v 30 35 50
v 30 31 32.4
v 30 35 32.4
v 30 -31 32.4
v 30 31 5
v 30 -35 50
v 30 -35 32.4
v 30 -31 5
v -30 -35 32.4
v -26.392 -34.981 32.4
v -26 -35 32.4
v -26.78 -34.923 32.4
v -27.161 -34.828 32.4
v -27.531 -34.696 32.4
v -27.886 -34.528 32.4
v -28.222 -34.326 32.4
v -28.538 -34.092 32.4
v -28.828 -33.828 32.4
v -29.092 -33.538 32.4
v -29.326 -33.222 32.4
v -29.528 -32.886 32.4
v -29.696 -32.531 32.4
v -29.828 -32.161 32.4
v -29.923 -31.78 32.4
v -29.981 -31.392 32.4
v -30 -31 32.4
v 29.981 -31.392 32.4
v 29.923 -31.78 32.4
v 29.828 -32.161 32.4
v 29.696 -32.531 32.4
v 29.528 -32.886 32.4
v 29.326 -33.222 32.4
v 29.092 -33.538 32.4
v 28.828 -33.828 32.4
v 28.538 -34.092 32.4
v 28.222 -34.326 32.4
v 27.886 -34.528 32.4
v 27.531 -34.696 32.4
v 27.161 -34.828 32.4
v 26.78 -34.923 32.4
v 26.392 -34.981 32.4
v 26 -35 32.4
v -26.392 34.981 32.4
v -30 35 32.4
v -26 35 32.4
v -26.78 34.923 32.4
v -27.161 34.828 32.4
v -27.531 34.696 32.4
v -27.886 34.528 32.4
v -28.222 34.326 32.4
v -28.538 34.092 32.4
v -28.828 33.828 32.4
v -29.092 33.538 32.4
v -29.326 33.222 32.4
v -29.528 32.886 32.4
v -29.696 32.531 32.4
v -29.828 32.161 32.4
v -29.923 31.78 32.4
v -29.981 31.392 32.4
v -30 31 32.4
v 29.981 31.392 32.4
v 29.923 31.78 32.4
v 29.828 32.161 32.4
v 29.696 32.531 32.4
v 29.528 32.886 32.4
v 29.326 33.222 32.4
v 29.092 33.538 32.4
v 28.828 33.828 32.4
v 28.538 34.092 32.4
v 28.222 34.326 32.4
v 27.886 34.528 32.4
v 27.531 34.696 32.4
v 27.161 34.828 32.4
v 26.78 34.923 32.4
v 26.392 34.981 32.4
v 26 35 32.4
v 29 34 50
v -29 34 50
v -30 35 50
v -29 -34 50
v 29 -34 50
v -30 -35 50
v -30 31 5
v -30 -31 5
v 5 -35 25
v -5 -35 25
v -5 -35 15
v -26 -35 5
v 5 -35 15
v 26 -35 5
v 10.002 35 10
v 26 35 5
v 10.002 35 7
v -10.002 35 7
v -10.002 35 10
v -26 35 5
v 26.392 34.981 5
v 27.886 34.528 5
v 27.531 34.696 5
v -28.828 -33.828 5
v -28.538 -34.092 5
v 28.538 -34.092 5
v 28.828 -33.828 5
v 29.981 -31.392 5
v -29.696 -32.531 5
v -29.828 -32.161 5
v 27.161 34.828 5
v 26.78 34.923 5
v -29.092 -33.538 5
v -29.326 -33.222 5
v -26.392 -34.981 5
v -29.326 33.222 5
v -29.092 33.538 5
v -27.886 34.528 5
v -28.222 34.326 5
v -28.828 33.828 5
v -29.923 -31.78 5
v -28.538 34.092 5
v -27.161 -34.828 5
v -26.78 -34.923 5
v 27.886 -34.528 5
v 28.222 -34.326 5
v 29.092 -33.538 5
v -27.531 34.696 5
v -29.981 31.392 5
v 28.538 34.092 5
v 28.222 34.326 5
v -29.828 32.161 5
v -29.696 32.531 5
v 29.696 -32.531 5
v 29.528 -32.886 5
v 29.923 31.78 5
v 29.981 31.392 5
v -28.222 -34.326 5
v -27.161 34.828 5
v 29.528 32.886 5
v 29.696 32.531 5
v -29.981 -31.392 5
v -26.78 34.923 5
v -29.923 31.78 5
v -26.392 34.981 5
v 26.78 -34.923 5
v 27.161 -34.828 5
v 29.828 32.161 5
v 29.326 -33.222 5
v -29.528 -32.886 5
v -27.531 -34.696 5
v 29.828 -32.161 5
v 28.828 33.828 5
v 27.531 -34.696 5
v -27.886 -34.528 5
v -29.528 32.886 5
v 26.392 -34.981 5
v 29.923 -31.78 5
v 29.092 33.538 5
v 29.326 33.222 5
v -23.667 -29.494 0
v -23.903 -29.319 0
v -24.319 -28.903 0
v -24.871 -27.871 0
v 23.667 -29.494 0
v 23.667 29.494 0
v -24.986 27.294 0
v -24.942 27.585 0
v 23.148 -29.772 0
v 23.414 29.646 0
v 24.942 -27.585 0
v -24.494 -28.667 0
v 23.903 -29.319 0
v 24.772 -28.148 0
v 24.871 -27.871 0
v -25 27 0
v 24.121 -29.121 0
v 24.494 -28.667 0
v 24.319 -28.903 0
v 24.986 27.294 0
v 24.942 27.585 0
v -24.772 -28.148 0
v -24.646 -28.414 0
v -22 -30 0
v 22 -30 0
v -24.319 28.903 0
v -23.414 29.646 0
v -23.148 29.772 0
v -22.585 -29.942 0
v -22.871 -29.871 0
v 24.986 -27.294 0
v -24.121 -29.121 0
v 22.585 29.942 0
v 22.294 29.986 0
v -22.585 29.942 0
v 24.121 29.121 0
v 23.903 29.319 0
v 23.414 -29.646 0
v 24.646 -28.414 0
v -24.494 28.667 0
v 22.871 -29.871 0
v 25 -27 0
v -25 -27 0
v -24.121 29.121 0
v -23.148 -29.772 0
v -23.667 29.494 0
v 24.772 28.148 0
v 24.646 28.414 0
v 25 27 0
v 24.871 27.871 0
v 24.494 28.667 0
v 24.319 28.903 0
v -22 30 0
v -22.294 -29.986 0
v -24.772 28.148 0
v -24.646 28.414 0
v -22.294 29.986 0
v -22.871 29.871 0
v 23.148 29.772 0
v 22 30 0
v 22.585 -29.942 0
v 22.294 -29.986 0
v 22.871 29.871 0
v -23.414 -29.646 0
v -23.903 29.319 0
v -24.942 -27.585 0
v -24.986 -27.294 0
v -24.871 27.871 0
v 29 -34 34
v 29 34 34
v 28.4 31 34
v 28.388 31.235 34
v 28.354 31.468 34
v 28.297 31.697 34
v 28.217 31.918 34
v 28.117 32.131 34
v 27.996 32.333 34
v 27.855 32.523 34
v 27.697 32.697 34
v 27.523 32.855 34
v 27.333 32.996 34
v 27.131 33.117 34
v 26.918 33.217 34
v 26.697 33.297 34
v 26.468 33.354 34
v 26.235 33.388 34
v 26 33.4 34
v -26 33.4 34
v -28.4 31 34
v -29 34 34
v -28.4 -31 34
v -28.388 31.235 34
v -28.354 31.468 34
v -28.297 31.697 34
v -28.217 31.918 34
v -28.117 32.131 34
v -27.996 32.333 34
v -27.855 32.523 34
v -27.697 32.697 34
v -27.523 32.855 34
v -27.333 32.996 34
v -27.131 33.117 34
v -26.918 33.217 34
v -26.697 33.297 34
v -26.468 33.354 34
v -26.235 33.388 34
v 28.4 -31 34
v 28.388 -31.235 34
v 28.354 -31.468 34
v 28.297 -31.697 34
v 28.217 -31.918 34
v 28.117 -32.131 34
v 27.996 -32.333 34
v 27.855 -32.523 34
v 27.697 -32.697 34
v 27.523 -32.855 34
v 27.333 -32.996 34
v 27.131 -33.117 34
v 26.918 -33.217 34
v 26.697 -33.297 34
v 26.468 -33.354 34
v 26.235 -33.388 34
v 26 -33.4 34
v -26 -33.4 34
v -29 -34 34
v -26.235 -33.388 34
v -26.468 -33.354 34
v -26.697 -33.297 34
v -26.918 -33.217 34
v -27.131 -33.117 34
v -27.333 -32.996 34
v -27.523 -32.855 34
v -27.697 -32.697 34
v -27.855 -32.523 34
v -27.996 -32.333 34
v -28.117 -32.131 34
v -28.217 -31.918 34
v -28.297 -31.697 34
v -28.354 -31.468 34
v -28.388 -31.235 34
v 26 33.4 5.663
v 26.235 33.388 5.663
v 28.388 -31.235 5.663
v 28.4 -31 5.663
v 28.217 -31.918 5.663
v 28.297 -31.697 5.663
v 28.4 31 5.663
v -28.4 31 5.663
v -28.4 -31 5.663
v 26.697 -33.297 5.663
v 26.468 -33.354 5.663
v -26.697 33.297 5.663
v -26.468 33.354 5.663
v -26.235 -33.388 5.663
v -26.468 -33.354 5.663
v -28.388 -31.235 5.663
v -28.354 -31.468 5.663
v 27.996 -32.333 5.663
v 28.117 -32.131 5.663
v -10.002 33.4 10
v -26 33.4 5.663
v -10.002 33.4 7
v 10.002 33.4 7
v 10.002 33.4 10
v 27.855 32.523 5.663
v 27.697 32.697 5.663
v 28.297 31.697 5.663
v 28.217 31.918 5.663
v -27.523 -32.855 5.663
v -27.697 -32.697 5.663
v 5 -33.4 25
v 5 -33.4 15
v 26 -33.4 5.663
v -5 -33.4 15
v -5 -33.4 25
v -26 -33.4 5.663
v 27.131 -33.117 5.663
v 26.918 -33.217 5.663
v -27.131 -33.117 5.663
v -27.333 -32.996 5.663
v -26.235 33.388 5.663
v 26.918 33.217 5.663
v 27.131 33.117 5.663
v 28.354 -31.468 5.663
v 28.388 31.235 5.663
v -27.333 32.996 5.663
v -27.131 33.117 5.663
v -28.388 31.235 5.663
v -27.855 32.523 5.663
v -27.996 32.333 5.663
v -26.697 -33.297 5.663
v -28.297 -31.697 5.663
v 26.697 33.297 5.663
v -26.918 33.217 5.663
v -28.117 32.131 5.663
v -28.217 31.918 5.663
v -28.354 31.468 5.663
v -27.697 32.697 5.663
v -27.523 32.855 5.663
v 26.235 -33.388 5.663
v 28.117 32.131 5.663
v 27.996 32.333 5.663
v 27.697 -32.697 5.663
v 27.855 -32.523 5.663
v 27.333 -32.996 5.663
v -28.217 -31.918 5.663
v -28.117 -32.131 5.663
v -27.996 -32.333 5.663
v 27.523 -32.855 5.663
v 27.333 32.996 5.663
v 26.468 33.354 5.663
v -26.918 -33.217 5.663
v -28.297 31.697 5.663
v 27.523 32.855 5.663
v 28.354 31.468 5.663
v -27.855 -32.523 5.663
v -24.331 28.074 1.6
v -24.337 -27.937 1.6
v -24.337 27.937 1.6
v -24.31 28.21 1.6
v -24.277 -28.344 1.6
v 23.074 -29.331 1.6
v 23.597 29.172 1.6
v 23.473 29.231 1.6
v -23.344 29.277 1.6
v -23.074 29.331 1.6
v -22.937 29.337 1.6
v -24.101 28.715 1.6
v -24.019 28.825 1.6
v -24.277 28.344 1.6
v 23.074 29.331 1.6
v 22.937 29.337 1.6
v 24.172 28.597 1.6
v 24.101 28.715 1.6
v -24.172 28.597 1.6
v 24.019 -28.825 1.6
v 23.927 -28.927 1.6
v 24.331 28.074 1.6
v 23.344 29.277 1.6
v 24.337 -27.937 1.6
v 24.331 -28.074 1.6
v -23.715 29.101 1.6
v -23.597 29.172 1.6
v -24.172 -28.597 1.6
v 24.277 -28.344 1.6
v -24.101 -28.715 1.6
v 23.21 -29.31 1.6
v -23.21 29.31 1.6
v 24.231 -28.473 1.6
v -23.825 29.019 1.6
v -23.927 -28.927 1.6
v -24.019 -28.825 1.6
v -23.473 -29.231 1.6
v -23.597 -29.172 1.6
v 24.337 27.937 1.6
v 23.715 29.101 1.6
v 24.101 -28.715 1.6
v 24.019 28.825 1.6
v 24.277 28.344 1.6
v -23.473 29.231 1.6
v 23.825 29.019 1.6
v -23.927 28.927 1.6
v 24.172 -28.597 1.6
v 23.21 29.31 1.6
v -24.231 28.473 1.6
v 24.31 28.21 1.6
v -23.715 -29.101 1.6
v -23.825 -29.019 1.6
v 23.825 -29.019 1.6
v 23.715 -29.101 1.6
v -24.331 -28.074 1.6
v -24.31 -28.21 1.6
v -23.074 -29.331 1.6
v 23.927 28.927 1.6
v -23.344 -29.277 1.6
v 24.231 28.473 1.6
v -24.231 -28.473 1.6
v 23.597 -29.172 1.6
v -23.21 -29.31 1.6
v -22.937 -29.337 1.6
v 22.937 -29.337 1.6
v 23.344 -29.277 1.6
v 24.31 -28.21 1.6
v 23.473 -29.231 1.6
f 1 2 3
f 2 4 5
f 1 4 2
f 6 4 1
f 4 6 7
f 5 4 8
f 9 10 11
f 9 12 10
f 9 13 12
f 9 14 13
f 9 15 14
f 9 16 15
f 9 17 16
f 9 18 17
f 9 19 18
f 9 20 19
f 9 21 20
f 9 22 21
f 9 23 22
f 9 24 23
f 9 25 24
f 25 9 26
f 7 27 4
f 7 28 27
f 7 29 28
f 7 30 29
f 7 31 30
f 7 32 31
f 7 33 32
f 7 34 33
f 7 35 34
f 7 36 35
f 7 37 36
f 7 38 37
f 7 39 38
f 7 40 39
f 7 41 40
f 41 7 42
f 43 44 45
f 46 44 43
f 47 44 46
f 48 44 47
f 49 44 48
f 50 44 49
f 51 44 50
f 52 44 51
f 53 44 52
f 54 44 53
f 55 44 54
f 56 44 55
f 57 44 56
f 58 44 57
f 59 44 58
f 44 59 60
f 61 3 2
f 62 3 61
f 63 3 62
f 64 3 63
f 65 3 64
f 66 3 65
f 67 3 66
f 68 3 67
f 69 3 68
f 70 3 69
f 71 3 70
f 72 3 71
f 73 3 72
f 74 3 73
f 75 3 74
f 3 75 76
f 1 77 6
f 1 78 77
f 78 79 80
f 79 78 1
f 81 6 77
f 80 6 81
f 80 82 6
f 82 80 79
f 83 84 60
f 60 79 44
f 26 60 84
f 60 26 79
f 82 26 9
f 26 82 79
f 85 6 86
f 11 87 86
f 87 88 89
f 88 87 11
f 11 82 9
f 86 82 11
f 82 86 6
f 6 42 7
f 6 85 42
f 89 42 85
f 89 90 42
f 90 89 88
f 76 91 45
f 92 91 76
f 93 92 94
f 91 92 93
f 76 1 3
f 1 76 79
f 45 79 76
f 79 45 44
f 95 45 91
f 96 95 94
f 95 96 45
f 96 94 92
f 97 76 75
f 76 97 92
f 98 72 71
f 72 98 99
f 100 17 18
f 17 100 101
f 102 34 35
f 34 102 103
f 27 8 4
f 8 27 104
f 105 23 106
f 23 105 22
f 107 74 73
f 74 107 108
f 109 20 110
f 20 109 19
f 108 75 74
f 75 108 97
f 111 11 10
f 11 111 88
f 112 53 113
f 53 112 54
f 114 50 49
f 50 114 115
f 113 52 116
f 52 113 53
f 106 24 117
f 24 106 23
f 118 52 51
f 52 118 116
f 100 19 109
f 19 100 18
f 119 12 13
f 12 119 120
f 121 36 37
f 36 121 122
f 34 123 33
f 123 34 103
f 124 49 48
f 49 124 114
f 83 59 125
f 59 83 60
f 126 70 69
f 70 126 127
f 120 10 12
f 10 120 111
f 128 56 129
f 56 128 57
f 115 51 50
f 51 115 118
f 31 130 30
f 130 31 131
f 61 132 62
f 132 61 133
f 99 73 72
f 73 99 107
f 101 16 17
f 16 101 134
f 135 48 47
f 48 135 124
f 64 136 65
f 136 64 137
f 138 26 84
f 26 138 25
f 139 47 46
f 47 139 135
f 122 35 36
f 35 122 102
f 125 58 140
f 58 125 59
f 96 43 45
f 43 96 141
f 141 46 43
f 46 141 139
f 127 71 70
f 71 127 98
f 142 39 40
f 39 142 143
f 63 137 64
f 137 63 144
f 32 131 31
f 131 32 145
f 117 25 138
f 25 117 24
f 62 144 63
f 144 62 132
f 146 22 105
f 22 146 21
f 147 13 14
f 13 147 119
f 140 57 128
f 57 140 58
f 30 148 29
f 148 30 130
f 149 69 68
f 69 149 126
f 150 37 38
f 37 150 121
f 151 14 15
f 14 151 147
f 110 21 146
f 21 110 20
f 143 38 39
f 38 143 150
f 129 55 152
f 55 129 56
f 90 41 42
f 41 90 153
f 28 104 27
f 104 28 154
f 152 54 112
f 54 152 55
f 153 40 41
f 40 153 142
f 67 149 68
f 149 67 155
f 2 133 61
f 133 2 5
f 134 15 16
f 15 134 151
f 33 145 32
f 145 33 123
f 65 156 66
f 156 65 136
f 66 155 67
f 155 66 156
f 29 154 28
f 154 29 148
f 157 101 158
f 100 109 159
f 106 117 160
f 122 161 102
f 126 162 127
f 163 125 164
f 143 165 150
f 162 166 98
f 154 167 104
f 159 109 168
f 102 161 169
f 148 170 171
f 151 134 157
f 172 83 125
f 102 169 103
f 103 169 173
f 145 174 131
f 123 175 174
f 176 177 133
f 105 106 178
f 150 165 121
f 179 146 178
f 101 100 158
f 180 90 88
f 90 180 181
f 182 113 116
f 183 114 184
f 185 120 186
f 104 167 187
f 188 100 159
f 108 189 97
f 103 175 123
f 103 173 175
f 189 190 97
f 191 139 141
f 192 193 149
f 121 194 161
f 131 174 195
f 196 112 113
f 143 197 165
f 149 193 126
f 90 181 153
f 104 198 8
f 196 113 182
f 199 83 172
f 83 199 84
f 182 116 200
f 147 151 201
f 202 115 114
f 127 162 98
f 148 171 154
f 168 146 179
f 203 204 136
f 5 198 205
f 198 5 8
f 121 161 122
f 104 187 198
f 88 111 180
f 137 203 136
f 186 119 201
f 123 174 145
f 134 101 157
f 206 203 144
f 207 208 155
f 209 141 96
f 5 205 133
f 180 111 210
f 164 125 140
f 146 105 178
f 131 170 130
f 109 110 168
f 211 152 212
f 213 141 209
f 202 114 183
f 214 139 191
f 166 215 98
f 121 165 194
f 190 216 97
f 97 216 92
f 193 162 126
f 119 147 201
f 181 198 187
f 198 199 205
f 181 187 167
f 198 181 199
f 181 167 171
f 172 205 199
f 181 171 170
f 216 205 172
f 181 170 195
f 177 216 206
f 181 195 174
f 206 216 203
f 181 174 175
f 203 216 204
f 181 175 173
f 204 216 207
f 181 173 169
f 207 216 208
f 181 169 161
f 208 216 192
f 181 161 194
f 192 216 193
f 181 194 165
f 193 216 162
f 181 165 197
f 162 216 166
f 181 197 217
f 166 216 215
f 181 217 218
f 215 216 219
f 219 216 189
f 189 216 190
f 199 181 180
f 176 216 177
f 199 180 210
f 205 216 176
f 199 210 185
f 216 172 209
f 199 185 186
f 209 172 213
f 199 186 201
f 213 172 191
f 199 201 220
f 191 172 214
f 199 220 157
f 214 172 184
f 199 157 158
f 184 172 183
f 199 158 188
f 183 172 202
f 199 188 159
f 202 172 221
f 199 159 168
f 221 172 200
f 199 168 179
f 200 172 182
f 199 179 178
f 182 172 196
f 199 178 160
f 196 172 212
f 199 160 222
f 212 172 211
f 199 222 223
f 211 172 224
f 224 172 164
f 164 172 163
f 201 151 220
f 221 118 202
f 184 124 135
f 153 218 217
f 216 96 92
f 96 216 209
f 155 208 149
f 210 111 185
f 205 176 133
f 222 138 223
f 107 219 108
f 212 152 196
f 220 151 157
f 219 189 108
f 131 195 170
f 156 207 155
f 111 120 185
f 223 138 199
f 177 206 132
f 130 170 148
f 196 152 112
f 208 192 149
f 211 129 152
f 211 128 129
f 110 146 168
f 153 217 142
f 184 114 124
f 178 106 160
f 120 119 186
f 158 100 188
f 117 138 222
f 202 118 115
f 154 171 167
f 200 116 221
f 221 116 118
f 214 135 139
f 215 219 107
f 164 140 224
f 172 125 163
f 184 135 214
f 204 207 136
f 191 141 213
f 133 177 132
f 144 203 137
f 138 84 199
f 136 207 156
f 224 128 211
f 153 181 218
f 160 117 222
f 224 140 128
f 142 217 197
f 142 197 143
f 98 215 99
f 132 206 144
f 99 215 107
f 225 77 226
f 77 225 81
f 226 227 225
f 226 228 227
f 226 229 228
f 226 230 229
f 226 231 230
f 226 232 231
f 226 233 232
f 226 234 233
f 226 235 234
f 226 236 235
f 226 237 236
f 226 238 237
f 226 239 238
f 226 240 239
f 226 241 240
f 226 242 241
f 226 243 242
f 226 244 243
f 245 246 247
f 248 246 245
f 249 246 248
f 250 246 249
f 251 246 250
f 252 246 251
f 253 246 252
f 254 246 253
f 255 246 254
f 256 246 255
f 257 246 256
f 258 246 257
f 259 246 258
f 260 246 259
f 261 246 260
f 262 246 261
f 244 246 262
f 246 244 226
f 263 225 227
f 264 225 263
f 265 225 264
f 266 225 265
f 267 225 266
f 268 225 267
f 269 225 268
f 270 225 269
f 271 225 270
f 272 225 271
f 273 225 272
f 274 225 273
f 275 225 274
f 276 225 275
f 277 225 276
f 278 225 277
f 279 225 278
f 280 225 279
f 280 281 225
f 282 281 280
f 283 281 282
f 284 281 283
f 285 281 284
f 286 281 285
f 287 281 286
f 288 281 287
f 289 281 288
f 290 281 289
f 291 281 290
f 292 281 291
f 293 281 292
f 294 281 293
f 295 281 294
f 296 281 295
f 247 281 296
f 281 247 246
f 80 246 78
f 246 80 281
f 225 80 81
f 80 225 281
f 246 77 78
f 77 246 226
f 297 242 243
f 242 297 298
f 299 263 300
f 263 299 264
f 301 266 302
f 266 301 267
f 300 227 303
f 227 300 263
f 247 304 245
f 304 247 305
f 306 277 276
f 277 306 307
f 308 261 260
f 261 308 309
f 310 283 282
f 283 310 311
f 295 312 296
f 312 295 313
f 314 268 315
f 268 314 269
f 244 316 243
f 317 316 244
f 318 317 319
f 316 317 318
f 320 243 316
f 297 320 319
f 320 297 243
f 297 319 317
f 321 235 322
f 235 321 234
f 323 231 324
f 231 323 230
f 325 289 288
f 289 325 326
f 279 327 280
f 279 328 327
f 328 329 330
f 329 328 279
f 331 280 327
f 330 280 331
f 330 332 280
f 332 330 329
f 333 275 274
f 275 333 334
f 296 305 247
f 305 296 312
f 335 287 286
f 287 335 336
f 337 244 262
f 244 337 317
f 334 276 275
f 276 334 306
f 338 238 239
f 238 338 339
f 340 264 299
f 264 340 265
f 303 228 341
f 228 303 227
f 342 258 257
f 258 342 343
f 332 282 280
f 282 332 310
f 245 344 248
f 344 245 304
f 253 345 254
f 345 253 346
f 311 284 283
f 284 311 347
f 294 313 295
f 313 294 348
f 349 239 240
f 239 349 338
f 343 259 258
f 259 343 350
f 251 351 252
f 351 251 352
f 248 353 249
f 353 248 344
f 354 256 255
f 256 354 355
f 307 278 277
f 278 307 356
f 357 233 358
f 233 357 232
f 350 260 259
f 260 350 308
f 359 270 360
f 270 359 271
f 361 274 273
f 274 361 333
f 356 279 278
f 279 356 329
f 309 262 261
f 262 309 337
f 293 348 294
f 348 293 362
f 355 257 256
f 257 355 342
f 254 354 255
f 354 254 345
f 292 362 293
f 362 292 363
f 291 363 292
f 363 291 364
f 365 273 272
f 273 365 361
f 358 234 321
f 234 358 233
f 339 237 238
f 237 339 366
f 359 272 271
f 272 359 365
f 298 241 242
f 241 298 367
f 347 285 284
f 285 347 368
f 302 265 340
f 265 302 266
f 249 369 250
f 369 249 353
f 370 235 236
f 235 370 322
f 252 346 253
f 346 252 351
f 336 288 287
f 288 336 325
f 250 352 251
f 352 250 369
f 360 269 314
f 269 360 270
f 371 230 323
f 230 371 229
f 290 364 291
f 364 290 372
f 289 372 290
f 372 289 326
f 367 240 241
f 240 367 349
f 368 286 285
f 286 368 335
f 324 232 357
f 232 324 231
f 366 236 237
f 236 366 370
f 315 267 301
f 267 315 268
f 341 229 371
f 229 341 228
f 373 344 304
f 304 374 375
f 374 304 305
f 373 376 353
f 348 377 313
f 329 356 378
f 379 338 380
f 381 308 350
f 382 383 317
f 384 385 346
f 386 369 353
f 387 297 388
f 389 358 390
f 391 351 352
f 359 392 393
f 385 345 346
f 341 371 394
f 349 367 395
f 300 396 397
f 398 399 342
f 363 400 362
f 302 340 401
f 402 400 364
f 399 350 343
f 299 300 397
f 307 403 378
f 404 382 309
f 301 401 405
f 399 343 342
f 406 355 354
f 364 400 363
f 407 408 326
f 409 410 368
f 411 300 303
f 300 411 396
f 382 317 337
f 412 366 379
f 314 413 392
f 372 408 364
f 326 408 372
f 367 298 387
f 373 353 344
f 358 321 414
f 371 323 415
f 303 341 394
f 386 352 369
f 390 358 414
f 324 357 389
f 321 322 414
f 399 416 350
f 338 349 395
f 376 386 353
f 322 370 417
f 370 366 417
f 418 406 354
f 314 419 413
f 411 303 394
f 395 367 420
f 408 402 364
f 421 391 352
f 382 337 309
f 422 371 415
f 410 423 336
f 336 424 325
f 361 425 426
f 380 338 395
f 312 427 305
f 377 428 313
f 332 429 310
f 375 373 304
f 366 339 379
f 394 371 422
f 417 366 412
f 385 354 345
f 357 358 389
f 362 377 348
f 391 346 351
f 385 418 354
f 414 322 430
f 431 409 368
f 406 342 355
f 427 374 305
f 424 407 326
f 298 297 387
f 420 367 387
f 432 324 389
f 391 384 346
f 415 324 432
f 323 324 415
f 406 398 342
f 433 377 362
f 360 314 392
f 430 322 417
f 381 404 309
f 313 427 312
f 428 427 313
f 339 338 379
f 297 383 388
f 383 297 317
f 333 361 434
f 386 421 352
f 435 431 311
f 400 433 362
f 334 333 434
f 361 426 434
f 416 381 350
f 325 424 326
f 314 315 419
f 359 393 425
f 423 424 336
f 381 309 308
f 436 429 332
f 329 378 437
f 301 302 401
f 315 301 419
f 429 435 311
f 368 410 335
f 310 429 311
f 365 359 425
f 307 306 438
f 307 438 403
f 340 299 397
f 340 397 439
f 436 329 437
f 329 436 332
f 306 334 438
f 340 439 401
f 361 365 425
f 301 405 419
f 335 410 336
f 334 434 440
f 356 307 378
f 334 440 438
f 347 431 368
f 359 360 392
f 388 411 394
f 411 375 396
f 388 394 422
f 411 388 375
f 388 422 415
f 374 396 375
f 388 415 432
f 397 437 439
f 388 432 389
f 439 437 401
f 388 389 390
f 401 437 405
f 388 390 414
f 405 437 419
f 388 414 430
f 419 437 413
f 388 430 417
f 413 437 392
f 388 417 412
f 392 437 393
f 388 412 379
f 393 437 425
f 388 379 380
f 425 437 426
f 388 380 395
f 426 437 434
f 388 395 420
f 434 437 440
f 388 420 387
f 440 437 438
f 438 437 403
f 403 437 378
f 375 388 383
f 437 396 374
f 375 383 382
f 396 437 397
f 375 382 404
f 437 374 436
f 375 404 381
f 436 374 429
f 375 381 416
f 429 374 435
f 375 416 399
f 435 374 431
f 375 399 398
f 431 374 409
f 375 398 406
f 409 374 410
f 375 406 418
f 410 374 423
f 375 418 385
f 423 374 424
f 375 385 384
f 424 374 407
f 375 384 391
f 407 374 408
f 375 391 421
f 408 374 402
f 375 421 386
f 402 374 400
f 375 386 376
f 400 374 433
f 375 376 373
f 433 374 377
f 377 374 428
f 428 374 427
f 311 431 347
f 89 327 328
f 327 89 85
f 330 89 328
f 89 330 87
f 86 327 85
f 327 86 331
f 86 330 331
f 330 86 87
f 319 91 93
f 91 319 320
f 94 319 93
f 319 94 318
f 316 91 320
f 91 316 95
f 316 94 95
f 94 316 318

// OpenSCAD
// Corrected body: closed roof with a small sloping edge, not a raised rim.
// Millimetres; front = -Y, rear = +Y, assembled bottom = Z=0.
width = 60;
depth = 70;
height = 50;
bevel = 5;
wall = 1.6;
top_thickness = 1.6;
base_wall = 1;
base_band = 16;
corner_radius = 4;
usb_size = 10;
usb_top_offset = 15;
oled_slot_width = 20.005;
oled_slot_height = 3;
oled_slot_z = 40;
print_orientation = true;
$fn = 64;

module rounded_rectangle(w,d,r) {
    offset(r=r) square([w-2*r,d-2*r],center=true);
}

module profile_at(w,d,r,z) {
    translate([0,0,z]) linear_extrude(height=0.01)
        rounded_rectangle(w,d,r);
}

module body() {
    inner_bevel_z = height-bevel-wall*(sqrt(2)-1);
    inner_top_z = height-top_thickness;
    inner_shrink = inner_top_z-inner_bevel_z;
    difference() {
        union() {
            // Lower cavity is 58 x 68 x 16 mm with the widened footprint.
            translate([-width/2,-depth/2,0]) cube([width,depth,base_band+wall]);
            translate([0,0,base_band+wall])
                linear_extrude(height=height-bevel-base_band-wall)
                    rounded_rectangle(width,depth,corner_radius);
            // Small 5 mm sloped shoulder around a closed, flat central roof.
            hull() {
                profile_at(width,depth,corner_radius,height-bevel-0.01);
                profile_at(width-2*bevel,depth-2*bevel,3,height-0.01);
            }
        }
        translate([-width/2+base_wall,-depth/2+base_wall,-1])
            cube([width-2*base_wall,depth-2*base_wall,base_band+1]);
        translate([0,0,base_band])
            linear_extrude(height=inner_bevel_z-base_band)
                rounded_rectangle(width-2*wall,depth-2*wall,corner_radius-wall);
        hull() {
            profile_at(width-2*wall,depth-2*wall,corner_radius-wall,inner_bevel_z-0.01);
            profile_at(width-2*wall-2*inner_shrink,depth-2*wall-2*inner_shrink,
                       1.4,inner_top_z-0.01);
        }
        translate([-usb_size/2,depth/2-wall-1,height-usb_top_offset-usb_size])
            cube([usb_size,wall+2,usb_size]);
        // Original-style cable slot for an externally mounted OLED board.
        translate([-oled_slot_width/2,-depth/2-1,oled_slot_z])
            cube([oled_slot_width,wall+2,oled_slot_height]);
    }
}

if(print_orientation)
    translate([0,0,height]) rotate([180,0,0]) body();
else
    body();
